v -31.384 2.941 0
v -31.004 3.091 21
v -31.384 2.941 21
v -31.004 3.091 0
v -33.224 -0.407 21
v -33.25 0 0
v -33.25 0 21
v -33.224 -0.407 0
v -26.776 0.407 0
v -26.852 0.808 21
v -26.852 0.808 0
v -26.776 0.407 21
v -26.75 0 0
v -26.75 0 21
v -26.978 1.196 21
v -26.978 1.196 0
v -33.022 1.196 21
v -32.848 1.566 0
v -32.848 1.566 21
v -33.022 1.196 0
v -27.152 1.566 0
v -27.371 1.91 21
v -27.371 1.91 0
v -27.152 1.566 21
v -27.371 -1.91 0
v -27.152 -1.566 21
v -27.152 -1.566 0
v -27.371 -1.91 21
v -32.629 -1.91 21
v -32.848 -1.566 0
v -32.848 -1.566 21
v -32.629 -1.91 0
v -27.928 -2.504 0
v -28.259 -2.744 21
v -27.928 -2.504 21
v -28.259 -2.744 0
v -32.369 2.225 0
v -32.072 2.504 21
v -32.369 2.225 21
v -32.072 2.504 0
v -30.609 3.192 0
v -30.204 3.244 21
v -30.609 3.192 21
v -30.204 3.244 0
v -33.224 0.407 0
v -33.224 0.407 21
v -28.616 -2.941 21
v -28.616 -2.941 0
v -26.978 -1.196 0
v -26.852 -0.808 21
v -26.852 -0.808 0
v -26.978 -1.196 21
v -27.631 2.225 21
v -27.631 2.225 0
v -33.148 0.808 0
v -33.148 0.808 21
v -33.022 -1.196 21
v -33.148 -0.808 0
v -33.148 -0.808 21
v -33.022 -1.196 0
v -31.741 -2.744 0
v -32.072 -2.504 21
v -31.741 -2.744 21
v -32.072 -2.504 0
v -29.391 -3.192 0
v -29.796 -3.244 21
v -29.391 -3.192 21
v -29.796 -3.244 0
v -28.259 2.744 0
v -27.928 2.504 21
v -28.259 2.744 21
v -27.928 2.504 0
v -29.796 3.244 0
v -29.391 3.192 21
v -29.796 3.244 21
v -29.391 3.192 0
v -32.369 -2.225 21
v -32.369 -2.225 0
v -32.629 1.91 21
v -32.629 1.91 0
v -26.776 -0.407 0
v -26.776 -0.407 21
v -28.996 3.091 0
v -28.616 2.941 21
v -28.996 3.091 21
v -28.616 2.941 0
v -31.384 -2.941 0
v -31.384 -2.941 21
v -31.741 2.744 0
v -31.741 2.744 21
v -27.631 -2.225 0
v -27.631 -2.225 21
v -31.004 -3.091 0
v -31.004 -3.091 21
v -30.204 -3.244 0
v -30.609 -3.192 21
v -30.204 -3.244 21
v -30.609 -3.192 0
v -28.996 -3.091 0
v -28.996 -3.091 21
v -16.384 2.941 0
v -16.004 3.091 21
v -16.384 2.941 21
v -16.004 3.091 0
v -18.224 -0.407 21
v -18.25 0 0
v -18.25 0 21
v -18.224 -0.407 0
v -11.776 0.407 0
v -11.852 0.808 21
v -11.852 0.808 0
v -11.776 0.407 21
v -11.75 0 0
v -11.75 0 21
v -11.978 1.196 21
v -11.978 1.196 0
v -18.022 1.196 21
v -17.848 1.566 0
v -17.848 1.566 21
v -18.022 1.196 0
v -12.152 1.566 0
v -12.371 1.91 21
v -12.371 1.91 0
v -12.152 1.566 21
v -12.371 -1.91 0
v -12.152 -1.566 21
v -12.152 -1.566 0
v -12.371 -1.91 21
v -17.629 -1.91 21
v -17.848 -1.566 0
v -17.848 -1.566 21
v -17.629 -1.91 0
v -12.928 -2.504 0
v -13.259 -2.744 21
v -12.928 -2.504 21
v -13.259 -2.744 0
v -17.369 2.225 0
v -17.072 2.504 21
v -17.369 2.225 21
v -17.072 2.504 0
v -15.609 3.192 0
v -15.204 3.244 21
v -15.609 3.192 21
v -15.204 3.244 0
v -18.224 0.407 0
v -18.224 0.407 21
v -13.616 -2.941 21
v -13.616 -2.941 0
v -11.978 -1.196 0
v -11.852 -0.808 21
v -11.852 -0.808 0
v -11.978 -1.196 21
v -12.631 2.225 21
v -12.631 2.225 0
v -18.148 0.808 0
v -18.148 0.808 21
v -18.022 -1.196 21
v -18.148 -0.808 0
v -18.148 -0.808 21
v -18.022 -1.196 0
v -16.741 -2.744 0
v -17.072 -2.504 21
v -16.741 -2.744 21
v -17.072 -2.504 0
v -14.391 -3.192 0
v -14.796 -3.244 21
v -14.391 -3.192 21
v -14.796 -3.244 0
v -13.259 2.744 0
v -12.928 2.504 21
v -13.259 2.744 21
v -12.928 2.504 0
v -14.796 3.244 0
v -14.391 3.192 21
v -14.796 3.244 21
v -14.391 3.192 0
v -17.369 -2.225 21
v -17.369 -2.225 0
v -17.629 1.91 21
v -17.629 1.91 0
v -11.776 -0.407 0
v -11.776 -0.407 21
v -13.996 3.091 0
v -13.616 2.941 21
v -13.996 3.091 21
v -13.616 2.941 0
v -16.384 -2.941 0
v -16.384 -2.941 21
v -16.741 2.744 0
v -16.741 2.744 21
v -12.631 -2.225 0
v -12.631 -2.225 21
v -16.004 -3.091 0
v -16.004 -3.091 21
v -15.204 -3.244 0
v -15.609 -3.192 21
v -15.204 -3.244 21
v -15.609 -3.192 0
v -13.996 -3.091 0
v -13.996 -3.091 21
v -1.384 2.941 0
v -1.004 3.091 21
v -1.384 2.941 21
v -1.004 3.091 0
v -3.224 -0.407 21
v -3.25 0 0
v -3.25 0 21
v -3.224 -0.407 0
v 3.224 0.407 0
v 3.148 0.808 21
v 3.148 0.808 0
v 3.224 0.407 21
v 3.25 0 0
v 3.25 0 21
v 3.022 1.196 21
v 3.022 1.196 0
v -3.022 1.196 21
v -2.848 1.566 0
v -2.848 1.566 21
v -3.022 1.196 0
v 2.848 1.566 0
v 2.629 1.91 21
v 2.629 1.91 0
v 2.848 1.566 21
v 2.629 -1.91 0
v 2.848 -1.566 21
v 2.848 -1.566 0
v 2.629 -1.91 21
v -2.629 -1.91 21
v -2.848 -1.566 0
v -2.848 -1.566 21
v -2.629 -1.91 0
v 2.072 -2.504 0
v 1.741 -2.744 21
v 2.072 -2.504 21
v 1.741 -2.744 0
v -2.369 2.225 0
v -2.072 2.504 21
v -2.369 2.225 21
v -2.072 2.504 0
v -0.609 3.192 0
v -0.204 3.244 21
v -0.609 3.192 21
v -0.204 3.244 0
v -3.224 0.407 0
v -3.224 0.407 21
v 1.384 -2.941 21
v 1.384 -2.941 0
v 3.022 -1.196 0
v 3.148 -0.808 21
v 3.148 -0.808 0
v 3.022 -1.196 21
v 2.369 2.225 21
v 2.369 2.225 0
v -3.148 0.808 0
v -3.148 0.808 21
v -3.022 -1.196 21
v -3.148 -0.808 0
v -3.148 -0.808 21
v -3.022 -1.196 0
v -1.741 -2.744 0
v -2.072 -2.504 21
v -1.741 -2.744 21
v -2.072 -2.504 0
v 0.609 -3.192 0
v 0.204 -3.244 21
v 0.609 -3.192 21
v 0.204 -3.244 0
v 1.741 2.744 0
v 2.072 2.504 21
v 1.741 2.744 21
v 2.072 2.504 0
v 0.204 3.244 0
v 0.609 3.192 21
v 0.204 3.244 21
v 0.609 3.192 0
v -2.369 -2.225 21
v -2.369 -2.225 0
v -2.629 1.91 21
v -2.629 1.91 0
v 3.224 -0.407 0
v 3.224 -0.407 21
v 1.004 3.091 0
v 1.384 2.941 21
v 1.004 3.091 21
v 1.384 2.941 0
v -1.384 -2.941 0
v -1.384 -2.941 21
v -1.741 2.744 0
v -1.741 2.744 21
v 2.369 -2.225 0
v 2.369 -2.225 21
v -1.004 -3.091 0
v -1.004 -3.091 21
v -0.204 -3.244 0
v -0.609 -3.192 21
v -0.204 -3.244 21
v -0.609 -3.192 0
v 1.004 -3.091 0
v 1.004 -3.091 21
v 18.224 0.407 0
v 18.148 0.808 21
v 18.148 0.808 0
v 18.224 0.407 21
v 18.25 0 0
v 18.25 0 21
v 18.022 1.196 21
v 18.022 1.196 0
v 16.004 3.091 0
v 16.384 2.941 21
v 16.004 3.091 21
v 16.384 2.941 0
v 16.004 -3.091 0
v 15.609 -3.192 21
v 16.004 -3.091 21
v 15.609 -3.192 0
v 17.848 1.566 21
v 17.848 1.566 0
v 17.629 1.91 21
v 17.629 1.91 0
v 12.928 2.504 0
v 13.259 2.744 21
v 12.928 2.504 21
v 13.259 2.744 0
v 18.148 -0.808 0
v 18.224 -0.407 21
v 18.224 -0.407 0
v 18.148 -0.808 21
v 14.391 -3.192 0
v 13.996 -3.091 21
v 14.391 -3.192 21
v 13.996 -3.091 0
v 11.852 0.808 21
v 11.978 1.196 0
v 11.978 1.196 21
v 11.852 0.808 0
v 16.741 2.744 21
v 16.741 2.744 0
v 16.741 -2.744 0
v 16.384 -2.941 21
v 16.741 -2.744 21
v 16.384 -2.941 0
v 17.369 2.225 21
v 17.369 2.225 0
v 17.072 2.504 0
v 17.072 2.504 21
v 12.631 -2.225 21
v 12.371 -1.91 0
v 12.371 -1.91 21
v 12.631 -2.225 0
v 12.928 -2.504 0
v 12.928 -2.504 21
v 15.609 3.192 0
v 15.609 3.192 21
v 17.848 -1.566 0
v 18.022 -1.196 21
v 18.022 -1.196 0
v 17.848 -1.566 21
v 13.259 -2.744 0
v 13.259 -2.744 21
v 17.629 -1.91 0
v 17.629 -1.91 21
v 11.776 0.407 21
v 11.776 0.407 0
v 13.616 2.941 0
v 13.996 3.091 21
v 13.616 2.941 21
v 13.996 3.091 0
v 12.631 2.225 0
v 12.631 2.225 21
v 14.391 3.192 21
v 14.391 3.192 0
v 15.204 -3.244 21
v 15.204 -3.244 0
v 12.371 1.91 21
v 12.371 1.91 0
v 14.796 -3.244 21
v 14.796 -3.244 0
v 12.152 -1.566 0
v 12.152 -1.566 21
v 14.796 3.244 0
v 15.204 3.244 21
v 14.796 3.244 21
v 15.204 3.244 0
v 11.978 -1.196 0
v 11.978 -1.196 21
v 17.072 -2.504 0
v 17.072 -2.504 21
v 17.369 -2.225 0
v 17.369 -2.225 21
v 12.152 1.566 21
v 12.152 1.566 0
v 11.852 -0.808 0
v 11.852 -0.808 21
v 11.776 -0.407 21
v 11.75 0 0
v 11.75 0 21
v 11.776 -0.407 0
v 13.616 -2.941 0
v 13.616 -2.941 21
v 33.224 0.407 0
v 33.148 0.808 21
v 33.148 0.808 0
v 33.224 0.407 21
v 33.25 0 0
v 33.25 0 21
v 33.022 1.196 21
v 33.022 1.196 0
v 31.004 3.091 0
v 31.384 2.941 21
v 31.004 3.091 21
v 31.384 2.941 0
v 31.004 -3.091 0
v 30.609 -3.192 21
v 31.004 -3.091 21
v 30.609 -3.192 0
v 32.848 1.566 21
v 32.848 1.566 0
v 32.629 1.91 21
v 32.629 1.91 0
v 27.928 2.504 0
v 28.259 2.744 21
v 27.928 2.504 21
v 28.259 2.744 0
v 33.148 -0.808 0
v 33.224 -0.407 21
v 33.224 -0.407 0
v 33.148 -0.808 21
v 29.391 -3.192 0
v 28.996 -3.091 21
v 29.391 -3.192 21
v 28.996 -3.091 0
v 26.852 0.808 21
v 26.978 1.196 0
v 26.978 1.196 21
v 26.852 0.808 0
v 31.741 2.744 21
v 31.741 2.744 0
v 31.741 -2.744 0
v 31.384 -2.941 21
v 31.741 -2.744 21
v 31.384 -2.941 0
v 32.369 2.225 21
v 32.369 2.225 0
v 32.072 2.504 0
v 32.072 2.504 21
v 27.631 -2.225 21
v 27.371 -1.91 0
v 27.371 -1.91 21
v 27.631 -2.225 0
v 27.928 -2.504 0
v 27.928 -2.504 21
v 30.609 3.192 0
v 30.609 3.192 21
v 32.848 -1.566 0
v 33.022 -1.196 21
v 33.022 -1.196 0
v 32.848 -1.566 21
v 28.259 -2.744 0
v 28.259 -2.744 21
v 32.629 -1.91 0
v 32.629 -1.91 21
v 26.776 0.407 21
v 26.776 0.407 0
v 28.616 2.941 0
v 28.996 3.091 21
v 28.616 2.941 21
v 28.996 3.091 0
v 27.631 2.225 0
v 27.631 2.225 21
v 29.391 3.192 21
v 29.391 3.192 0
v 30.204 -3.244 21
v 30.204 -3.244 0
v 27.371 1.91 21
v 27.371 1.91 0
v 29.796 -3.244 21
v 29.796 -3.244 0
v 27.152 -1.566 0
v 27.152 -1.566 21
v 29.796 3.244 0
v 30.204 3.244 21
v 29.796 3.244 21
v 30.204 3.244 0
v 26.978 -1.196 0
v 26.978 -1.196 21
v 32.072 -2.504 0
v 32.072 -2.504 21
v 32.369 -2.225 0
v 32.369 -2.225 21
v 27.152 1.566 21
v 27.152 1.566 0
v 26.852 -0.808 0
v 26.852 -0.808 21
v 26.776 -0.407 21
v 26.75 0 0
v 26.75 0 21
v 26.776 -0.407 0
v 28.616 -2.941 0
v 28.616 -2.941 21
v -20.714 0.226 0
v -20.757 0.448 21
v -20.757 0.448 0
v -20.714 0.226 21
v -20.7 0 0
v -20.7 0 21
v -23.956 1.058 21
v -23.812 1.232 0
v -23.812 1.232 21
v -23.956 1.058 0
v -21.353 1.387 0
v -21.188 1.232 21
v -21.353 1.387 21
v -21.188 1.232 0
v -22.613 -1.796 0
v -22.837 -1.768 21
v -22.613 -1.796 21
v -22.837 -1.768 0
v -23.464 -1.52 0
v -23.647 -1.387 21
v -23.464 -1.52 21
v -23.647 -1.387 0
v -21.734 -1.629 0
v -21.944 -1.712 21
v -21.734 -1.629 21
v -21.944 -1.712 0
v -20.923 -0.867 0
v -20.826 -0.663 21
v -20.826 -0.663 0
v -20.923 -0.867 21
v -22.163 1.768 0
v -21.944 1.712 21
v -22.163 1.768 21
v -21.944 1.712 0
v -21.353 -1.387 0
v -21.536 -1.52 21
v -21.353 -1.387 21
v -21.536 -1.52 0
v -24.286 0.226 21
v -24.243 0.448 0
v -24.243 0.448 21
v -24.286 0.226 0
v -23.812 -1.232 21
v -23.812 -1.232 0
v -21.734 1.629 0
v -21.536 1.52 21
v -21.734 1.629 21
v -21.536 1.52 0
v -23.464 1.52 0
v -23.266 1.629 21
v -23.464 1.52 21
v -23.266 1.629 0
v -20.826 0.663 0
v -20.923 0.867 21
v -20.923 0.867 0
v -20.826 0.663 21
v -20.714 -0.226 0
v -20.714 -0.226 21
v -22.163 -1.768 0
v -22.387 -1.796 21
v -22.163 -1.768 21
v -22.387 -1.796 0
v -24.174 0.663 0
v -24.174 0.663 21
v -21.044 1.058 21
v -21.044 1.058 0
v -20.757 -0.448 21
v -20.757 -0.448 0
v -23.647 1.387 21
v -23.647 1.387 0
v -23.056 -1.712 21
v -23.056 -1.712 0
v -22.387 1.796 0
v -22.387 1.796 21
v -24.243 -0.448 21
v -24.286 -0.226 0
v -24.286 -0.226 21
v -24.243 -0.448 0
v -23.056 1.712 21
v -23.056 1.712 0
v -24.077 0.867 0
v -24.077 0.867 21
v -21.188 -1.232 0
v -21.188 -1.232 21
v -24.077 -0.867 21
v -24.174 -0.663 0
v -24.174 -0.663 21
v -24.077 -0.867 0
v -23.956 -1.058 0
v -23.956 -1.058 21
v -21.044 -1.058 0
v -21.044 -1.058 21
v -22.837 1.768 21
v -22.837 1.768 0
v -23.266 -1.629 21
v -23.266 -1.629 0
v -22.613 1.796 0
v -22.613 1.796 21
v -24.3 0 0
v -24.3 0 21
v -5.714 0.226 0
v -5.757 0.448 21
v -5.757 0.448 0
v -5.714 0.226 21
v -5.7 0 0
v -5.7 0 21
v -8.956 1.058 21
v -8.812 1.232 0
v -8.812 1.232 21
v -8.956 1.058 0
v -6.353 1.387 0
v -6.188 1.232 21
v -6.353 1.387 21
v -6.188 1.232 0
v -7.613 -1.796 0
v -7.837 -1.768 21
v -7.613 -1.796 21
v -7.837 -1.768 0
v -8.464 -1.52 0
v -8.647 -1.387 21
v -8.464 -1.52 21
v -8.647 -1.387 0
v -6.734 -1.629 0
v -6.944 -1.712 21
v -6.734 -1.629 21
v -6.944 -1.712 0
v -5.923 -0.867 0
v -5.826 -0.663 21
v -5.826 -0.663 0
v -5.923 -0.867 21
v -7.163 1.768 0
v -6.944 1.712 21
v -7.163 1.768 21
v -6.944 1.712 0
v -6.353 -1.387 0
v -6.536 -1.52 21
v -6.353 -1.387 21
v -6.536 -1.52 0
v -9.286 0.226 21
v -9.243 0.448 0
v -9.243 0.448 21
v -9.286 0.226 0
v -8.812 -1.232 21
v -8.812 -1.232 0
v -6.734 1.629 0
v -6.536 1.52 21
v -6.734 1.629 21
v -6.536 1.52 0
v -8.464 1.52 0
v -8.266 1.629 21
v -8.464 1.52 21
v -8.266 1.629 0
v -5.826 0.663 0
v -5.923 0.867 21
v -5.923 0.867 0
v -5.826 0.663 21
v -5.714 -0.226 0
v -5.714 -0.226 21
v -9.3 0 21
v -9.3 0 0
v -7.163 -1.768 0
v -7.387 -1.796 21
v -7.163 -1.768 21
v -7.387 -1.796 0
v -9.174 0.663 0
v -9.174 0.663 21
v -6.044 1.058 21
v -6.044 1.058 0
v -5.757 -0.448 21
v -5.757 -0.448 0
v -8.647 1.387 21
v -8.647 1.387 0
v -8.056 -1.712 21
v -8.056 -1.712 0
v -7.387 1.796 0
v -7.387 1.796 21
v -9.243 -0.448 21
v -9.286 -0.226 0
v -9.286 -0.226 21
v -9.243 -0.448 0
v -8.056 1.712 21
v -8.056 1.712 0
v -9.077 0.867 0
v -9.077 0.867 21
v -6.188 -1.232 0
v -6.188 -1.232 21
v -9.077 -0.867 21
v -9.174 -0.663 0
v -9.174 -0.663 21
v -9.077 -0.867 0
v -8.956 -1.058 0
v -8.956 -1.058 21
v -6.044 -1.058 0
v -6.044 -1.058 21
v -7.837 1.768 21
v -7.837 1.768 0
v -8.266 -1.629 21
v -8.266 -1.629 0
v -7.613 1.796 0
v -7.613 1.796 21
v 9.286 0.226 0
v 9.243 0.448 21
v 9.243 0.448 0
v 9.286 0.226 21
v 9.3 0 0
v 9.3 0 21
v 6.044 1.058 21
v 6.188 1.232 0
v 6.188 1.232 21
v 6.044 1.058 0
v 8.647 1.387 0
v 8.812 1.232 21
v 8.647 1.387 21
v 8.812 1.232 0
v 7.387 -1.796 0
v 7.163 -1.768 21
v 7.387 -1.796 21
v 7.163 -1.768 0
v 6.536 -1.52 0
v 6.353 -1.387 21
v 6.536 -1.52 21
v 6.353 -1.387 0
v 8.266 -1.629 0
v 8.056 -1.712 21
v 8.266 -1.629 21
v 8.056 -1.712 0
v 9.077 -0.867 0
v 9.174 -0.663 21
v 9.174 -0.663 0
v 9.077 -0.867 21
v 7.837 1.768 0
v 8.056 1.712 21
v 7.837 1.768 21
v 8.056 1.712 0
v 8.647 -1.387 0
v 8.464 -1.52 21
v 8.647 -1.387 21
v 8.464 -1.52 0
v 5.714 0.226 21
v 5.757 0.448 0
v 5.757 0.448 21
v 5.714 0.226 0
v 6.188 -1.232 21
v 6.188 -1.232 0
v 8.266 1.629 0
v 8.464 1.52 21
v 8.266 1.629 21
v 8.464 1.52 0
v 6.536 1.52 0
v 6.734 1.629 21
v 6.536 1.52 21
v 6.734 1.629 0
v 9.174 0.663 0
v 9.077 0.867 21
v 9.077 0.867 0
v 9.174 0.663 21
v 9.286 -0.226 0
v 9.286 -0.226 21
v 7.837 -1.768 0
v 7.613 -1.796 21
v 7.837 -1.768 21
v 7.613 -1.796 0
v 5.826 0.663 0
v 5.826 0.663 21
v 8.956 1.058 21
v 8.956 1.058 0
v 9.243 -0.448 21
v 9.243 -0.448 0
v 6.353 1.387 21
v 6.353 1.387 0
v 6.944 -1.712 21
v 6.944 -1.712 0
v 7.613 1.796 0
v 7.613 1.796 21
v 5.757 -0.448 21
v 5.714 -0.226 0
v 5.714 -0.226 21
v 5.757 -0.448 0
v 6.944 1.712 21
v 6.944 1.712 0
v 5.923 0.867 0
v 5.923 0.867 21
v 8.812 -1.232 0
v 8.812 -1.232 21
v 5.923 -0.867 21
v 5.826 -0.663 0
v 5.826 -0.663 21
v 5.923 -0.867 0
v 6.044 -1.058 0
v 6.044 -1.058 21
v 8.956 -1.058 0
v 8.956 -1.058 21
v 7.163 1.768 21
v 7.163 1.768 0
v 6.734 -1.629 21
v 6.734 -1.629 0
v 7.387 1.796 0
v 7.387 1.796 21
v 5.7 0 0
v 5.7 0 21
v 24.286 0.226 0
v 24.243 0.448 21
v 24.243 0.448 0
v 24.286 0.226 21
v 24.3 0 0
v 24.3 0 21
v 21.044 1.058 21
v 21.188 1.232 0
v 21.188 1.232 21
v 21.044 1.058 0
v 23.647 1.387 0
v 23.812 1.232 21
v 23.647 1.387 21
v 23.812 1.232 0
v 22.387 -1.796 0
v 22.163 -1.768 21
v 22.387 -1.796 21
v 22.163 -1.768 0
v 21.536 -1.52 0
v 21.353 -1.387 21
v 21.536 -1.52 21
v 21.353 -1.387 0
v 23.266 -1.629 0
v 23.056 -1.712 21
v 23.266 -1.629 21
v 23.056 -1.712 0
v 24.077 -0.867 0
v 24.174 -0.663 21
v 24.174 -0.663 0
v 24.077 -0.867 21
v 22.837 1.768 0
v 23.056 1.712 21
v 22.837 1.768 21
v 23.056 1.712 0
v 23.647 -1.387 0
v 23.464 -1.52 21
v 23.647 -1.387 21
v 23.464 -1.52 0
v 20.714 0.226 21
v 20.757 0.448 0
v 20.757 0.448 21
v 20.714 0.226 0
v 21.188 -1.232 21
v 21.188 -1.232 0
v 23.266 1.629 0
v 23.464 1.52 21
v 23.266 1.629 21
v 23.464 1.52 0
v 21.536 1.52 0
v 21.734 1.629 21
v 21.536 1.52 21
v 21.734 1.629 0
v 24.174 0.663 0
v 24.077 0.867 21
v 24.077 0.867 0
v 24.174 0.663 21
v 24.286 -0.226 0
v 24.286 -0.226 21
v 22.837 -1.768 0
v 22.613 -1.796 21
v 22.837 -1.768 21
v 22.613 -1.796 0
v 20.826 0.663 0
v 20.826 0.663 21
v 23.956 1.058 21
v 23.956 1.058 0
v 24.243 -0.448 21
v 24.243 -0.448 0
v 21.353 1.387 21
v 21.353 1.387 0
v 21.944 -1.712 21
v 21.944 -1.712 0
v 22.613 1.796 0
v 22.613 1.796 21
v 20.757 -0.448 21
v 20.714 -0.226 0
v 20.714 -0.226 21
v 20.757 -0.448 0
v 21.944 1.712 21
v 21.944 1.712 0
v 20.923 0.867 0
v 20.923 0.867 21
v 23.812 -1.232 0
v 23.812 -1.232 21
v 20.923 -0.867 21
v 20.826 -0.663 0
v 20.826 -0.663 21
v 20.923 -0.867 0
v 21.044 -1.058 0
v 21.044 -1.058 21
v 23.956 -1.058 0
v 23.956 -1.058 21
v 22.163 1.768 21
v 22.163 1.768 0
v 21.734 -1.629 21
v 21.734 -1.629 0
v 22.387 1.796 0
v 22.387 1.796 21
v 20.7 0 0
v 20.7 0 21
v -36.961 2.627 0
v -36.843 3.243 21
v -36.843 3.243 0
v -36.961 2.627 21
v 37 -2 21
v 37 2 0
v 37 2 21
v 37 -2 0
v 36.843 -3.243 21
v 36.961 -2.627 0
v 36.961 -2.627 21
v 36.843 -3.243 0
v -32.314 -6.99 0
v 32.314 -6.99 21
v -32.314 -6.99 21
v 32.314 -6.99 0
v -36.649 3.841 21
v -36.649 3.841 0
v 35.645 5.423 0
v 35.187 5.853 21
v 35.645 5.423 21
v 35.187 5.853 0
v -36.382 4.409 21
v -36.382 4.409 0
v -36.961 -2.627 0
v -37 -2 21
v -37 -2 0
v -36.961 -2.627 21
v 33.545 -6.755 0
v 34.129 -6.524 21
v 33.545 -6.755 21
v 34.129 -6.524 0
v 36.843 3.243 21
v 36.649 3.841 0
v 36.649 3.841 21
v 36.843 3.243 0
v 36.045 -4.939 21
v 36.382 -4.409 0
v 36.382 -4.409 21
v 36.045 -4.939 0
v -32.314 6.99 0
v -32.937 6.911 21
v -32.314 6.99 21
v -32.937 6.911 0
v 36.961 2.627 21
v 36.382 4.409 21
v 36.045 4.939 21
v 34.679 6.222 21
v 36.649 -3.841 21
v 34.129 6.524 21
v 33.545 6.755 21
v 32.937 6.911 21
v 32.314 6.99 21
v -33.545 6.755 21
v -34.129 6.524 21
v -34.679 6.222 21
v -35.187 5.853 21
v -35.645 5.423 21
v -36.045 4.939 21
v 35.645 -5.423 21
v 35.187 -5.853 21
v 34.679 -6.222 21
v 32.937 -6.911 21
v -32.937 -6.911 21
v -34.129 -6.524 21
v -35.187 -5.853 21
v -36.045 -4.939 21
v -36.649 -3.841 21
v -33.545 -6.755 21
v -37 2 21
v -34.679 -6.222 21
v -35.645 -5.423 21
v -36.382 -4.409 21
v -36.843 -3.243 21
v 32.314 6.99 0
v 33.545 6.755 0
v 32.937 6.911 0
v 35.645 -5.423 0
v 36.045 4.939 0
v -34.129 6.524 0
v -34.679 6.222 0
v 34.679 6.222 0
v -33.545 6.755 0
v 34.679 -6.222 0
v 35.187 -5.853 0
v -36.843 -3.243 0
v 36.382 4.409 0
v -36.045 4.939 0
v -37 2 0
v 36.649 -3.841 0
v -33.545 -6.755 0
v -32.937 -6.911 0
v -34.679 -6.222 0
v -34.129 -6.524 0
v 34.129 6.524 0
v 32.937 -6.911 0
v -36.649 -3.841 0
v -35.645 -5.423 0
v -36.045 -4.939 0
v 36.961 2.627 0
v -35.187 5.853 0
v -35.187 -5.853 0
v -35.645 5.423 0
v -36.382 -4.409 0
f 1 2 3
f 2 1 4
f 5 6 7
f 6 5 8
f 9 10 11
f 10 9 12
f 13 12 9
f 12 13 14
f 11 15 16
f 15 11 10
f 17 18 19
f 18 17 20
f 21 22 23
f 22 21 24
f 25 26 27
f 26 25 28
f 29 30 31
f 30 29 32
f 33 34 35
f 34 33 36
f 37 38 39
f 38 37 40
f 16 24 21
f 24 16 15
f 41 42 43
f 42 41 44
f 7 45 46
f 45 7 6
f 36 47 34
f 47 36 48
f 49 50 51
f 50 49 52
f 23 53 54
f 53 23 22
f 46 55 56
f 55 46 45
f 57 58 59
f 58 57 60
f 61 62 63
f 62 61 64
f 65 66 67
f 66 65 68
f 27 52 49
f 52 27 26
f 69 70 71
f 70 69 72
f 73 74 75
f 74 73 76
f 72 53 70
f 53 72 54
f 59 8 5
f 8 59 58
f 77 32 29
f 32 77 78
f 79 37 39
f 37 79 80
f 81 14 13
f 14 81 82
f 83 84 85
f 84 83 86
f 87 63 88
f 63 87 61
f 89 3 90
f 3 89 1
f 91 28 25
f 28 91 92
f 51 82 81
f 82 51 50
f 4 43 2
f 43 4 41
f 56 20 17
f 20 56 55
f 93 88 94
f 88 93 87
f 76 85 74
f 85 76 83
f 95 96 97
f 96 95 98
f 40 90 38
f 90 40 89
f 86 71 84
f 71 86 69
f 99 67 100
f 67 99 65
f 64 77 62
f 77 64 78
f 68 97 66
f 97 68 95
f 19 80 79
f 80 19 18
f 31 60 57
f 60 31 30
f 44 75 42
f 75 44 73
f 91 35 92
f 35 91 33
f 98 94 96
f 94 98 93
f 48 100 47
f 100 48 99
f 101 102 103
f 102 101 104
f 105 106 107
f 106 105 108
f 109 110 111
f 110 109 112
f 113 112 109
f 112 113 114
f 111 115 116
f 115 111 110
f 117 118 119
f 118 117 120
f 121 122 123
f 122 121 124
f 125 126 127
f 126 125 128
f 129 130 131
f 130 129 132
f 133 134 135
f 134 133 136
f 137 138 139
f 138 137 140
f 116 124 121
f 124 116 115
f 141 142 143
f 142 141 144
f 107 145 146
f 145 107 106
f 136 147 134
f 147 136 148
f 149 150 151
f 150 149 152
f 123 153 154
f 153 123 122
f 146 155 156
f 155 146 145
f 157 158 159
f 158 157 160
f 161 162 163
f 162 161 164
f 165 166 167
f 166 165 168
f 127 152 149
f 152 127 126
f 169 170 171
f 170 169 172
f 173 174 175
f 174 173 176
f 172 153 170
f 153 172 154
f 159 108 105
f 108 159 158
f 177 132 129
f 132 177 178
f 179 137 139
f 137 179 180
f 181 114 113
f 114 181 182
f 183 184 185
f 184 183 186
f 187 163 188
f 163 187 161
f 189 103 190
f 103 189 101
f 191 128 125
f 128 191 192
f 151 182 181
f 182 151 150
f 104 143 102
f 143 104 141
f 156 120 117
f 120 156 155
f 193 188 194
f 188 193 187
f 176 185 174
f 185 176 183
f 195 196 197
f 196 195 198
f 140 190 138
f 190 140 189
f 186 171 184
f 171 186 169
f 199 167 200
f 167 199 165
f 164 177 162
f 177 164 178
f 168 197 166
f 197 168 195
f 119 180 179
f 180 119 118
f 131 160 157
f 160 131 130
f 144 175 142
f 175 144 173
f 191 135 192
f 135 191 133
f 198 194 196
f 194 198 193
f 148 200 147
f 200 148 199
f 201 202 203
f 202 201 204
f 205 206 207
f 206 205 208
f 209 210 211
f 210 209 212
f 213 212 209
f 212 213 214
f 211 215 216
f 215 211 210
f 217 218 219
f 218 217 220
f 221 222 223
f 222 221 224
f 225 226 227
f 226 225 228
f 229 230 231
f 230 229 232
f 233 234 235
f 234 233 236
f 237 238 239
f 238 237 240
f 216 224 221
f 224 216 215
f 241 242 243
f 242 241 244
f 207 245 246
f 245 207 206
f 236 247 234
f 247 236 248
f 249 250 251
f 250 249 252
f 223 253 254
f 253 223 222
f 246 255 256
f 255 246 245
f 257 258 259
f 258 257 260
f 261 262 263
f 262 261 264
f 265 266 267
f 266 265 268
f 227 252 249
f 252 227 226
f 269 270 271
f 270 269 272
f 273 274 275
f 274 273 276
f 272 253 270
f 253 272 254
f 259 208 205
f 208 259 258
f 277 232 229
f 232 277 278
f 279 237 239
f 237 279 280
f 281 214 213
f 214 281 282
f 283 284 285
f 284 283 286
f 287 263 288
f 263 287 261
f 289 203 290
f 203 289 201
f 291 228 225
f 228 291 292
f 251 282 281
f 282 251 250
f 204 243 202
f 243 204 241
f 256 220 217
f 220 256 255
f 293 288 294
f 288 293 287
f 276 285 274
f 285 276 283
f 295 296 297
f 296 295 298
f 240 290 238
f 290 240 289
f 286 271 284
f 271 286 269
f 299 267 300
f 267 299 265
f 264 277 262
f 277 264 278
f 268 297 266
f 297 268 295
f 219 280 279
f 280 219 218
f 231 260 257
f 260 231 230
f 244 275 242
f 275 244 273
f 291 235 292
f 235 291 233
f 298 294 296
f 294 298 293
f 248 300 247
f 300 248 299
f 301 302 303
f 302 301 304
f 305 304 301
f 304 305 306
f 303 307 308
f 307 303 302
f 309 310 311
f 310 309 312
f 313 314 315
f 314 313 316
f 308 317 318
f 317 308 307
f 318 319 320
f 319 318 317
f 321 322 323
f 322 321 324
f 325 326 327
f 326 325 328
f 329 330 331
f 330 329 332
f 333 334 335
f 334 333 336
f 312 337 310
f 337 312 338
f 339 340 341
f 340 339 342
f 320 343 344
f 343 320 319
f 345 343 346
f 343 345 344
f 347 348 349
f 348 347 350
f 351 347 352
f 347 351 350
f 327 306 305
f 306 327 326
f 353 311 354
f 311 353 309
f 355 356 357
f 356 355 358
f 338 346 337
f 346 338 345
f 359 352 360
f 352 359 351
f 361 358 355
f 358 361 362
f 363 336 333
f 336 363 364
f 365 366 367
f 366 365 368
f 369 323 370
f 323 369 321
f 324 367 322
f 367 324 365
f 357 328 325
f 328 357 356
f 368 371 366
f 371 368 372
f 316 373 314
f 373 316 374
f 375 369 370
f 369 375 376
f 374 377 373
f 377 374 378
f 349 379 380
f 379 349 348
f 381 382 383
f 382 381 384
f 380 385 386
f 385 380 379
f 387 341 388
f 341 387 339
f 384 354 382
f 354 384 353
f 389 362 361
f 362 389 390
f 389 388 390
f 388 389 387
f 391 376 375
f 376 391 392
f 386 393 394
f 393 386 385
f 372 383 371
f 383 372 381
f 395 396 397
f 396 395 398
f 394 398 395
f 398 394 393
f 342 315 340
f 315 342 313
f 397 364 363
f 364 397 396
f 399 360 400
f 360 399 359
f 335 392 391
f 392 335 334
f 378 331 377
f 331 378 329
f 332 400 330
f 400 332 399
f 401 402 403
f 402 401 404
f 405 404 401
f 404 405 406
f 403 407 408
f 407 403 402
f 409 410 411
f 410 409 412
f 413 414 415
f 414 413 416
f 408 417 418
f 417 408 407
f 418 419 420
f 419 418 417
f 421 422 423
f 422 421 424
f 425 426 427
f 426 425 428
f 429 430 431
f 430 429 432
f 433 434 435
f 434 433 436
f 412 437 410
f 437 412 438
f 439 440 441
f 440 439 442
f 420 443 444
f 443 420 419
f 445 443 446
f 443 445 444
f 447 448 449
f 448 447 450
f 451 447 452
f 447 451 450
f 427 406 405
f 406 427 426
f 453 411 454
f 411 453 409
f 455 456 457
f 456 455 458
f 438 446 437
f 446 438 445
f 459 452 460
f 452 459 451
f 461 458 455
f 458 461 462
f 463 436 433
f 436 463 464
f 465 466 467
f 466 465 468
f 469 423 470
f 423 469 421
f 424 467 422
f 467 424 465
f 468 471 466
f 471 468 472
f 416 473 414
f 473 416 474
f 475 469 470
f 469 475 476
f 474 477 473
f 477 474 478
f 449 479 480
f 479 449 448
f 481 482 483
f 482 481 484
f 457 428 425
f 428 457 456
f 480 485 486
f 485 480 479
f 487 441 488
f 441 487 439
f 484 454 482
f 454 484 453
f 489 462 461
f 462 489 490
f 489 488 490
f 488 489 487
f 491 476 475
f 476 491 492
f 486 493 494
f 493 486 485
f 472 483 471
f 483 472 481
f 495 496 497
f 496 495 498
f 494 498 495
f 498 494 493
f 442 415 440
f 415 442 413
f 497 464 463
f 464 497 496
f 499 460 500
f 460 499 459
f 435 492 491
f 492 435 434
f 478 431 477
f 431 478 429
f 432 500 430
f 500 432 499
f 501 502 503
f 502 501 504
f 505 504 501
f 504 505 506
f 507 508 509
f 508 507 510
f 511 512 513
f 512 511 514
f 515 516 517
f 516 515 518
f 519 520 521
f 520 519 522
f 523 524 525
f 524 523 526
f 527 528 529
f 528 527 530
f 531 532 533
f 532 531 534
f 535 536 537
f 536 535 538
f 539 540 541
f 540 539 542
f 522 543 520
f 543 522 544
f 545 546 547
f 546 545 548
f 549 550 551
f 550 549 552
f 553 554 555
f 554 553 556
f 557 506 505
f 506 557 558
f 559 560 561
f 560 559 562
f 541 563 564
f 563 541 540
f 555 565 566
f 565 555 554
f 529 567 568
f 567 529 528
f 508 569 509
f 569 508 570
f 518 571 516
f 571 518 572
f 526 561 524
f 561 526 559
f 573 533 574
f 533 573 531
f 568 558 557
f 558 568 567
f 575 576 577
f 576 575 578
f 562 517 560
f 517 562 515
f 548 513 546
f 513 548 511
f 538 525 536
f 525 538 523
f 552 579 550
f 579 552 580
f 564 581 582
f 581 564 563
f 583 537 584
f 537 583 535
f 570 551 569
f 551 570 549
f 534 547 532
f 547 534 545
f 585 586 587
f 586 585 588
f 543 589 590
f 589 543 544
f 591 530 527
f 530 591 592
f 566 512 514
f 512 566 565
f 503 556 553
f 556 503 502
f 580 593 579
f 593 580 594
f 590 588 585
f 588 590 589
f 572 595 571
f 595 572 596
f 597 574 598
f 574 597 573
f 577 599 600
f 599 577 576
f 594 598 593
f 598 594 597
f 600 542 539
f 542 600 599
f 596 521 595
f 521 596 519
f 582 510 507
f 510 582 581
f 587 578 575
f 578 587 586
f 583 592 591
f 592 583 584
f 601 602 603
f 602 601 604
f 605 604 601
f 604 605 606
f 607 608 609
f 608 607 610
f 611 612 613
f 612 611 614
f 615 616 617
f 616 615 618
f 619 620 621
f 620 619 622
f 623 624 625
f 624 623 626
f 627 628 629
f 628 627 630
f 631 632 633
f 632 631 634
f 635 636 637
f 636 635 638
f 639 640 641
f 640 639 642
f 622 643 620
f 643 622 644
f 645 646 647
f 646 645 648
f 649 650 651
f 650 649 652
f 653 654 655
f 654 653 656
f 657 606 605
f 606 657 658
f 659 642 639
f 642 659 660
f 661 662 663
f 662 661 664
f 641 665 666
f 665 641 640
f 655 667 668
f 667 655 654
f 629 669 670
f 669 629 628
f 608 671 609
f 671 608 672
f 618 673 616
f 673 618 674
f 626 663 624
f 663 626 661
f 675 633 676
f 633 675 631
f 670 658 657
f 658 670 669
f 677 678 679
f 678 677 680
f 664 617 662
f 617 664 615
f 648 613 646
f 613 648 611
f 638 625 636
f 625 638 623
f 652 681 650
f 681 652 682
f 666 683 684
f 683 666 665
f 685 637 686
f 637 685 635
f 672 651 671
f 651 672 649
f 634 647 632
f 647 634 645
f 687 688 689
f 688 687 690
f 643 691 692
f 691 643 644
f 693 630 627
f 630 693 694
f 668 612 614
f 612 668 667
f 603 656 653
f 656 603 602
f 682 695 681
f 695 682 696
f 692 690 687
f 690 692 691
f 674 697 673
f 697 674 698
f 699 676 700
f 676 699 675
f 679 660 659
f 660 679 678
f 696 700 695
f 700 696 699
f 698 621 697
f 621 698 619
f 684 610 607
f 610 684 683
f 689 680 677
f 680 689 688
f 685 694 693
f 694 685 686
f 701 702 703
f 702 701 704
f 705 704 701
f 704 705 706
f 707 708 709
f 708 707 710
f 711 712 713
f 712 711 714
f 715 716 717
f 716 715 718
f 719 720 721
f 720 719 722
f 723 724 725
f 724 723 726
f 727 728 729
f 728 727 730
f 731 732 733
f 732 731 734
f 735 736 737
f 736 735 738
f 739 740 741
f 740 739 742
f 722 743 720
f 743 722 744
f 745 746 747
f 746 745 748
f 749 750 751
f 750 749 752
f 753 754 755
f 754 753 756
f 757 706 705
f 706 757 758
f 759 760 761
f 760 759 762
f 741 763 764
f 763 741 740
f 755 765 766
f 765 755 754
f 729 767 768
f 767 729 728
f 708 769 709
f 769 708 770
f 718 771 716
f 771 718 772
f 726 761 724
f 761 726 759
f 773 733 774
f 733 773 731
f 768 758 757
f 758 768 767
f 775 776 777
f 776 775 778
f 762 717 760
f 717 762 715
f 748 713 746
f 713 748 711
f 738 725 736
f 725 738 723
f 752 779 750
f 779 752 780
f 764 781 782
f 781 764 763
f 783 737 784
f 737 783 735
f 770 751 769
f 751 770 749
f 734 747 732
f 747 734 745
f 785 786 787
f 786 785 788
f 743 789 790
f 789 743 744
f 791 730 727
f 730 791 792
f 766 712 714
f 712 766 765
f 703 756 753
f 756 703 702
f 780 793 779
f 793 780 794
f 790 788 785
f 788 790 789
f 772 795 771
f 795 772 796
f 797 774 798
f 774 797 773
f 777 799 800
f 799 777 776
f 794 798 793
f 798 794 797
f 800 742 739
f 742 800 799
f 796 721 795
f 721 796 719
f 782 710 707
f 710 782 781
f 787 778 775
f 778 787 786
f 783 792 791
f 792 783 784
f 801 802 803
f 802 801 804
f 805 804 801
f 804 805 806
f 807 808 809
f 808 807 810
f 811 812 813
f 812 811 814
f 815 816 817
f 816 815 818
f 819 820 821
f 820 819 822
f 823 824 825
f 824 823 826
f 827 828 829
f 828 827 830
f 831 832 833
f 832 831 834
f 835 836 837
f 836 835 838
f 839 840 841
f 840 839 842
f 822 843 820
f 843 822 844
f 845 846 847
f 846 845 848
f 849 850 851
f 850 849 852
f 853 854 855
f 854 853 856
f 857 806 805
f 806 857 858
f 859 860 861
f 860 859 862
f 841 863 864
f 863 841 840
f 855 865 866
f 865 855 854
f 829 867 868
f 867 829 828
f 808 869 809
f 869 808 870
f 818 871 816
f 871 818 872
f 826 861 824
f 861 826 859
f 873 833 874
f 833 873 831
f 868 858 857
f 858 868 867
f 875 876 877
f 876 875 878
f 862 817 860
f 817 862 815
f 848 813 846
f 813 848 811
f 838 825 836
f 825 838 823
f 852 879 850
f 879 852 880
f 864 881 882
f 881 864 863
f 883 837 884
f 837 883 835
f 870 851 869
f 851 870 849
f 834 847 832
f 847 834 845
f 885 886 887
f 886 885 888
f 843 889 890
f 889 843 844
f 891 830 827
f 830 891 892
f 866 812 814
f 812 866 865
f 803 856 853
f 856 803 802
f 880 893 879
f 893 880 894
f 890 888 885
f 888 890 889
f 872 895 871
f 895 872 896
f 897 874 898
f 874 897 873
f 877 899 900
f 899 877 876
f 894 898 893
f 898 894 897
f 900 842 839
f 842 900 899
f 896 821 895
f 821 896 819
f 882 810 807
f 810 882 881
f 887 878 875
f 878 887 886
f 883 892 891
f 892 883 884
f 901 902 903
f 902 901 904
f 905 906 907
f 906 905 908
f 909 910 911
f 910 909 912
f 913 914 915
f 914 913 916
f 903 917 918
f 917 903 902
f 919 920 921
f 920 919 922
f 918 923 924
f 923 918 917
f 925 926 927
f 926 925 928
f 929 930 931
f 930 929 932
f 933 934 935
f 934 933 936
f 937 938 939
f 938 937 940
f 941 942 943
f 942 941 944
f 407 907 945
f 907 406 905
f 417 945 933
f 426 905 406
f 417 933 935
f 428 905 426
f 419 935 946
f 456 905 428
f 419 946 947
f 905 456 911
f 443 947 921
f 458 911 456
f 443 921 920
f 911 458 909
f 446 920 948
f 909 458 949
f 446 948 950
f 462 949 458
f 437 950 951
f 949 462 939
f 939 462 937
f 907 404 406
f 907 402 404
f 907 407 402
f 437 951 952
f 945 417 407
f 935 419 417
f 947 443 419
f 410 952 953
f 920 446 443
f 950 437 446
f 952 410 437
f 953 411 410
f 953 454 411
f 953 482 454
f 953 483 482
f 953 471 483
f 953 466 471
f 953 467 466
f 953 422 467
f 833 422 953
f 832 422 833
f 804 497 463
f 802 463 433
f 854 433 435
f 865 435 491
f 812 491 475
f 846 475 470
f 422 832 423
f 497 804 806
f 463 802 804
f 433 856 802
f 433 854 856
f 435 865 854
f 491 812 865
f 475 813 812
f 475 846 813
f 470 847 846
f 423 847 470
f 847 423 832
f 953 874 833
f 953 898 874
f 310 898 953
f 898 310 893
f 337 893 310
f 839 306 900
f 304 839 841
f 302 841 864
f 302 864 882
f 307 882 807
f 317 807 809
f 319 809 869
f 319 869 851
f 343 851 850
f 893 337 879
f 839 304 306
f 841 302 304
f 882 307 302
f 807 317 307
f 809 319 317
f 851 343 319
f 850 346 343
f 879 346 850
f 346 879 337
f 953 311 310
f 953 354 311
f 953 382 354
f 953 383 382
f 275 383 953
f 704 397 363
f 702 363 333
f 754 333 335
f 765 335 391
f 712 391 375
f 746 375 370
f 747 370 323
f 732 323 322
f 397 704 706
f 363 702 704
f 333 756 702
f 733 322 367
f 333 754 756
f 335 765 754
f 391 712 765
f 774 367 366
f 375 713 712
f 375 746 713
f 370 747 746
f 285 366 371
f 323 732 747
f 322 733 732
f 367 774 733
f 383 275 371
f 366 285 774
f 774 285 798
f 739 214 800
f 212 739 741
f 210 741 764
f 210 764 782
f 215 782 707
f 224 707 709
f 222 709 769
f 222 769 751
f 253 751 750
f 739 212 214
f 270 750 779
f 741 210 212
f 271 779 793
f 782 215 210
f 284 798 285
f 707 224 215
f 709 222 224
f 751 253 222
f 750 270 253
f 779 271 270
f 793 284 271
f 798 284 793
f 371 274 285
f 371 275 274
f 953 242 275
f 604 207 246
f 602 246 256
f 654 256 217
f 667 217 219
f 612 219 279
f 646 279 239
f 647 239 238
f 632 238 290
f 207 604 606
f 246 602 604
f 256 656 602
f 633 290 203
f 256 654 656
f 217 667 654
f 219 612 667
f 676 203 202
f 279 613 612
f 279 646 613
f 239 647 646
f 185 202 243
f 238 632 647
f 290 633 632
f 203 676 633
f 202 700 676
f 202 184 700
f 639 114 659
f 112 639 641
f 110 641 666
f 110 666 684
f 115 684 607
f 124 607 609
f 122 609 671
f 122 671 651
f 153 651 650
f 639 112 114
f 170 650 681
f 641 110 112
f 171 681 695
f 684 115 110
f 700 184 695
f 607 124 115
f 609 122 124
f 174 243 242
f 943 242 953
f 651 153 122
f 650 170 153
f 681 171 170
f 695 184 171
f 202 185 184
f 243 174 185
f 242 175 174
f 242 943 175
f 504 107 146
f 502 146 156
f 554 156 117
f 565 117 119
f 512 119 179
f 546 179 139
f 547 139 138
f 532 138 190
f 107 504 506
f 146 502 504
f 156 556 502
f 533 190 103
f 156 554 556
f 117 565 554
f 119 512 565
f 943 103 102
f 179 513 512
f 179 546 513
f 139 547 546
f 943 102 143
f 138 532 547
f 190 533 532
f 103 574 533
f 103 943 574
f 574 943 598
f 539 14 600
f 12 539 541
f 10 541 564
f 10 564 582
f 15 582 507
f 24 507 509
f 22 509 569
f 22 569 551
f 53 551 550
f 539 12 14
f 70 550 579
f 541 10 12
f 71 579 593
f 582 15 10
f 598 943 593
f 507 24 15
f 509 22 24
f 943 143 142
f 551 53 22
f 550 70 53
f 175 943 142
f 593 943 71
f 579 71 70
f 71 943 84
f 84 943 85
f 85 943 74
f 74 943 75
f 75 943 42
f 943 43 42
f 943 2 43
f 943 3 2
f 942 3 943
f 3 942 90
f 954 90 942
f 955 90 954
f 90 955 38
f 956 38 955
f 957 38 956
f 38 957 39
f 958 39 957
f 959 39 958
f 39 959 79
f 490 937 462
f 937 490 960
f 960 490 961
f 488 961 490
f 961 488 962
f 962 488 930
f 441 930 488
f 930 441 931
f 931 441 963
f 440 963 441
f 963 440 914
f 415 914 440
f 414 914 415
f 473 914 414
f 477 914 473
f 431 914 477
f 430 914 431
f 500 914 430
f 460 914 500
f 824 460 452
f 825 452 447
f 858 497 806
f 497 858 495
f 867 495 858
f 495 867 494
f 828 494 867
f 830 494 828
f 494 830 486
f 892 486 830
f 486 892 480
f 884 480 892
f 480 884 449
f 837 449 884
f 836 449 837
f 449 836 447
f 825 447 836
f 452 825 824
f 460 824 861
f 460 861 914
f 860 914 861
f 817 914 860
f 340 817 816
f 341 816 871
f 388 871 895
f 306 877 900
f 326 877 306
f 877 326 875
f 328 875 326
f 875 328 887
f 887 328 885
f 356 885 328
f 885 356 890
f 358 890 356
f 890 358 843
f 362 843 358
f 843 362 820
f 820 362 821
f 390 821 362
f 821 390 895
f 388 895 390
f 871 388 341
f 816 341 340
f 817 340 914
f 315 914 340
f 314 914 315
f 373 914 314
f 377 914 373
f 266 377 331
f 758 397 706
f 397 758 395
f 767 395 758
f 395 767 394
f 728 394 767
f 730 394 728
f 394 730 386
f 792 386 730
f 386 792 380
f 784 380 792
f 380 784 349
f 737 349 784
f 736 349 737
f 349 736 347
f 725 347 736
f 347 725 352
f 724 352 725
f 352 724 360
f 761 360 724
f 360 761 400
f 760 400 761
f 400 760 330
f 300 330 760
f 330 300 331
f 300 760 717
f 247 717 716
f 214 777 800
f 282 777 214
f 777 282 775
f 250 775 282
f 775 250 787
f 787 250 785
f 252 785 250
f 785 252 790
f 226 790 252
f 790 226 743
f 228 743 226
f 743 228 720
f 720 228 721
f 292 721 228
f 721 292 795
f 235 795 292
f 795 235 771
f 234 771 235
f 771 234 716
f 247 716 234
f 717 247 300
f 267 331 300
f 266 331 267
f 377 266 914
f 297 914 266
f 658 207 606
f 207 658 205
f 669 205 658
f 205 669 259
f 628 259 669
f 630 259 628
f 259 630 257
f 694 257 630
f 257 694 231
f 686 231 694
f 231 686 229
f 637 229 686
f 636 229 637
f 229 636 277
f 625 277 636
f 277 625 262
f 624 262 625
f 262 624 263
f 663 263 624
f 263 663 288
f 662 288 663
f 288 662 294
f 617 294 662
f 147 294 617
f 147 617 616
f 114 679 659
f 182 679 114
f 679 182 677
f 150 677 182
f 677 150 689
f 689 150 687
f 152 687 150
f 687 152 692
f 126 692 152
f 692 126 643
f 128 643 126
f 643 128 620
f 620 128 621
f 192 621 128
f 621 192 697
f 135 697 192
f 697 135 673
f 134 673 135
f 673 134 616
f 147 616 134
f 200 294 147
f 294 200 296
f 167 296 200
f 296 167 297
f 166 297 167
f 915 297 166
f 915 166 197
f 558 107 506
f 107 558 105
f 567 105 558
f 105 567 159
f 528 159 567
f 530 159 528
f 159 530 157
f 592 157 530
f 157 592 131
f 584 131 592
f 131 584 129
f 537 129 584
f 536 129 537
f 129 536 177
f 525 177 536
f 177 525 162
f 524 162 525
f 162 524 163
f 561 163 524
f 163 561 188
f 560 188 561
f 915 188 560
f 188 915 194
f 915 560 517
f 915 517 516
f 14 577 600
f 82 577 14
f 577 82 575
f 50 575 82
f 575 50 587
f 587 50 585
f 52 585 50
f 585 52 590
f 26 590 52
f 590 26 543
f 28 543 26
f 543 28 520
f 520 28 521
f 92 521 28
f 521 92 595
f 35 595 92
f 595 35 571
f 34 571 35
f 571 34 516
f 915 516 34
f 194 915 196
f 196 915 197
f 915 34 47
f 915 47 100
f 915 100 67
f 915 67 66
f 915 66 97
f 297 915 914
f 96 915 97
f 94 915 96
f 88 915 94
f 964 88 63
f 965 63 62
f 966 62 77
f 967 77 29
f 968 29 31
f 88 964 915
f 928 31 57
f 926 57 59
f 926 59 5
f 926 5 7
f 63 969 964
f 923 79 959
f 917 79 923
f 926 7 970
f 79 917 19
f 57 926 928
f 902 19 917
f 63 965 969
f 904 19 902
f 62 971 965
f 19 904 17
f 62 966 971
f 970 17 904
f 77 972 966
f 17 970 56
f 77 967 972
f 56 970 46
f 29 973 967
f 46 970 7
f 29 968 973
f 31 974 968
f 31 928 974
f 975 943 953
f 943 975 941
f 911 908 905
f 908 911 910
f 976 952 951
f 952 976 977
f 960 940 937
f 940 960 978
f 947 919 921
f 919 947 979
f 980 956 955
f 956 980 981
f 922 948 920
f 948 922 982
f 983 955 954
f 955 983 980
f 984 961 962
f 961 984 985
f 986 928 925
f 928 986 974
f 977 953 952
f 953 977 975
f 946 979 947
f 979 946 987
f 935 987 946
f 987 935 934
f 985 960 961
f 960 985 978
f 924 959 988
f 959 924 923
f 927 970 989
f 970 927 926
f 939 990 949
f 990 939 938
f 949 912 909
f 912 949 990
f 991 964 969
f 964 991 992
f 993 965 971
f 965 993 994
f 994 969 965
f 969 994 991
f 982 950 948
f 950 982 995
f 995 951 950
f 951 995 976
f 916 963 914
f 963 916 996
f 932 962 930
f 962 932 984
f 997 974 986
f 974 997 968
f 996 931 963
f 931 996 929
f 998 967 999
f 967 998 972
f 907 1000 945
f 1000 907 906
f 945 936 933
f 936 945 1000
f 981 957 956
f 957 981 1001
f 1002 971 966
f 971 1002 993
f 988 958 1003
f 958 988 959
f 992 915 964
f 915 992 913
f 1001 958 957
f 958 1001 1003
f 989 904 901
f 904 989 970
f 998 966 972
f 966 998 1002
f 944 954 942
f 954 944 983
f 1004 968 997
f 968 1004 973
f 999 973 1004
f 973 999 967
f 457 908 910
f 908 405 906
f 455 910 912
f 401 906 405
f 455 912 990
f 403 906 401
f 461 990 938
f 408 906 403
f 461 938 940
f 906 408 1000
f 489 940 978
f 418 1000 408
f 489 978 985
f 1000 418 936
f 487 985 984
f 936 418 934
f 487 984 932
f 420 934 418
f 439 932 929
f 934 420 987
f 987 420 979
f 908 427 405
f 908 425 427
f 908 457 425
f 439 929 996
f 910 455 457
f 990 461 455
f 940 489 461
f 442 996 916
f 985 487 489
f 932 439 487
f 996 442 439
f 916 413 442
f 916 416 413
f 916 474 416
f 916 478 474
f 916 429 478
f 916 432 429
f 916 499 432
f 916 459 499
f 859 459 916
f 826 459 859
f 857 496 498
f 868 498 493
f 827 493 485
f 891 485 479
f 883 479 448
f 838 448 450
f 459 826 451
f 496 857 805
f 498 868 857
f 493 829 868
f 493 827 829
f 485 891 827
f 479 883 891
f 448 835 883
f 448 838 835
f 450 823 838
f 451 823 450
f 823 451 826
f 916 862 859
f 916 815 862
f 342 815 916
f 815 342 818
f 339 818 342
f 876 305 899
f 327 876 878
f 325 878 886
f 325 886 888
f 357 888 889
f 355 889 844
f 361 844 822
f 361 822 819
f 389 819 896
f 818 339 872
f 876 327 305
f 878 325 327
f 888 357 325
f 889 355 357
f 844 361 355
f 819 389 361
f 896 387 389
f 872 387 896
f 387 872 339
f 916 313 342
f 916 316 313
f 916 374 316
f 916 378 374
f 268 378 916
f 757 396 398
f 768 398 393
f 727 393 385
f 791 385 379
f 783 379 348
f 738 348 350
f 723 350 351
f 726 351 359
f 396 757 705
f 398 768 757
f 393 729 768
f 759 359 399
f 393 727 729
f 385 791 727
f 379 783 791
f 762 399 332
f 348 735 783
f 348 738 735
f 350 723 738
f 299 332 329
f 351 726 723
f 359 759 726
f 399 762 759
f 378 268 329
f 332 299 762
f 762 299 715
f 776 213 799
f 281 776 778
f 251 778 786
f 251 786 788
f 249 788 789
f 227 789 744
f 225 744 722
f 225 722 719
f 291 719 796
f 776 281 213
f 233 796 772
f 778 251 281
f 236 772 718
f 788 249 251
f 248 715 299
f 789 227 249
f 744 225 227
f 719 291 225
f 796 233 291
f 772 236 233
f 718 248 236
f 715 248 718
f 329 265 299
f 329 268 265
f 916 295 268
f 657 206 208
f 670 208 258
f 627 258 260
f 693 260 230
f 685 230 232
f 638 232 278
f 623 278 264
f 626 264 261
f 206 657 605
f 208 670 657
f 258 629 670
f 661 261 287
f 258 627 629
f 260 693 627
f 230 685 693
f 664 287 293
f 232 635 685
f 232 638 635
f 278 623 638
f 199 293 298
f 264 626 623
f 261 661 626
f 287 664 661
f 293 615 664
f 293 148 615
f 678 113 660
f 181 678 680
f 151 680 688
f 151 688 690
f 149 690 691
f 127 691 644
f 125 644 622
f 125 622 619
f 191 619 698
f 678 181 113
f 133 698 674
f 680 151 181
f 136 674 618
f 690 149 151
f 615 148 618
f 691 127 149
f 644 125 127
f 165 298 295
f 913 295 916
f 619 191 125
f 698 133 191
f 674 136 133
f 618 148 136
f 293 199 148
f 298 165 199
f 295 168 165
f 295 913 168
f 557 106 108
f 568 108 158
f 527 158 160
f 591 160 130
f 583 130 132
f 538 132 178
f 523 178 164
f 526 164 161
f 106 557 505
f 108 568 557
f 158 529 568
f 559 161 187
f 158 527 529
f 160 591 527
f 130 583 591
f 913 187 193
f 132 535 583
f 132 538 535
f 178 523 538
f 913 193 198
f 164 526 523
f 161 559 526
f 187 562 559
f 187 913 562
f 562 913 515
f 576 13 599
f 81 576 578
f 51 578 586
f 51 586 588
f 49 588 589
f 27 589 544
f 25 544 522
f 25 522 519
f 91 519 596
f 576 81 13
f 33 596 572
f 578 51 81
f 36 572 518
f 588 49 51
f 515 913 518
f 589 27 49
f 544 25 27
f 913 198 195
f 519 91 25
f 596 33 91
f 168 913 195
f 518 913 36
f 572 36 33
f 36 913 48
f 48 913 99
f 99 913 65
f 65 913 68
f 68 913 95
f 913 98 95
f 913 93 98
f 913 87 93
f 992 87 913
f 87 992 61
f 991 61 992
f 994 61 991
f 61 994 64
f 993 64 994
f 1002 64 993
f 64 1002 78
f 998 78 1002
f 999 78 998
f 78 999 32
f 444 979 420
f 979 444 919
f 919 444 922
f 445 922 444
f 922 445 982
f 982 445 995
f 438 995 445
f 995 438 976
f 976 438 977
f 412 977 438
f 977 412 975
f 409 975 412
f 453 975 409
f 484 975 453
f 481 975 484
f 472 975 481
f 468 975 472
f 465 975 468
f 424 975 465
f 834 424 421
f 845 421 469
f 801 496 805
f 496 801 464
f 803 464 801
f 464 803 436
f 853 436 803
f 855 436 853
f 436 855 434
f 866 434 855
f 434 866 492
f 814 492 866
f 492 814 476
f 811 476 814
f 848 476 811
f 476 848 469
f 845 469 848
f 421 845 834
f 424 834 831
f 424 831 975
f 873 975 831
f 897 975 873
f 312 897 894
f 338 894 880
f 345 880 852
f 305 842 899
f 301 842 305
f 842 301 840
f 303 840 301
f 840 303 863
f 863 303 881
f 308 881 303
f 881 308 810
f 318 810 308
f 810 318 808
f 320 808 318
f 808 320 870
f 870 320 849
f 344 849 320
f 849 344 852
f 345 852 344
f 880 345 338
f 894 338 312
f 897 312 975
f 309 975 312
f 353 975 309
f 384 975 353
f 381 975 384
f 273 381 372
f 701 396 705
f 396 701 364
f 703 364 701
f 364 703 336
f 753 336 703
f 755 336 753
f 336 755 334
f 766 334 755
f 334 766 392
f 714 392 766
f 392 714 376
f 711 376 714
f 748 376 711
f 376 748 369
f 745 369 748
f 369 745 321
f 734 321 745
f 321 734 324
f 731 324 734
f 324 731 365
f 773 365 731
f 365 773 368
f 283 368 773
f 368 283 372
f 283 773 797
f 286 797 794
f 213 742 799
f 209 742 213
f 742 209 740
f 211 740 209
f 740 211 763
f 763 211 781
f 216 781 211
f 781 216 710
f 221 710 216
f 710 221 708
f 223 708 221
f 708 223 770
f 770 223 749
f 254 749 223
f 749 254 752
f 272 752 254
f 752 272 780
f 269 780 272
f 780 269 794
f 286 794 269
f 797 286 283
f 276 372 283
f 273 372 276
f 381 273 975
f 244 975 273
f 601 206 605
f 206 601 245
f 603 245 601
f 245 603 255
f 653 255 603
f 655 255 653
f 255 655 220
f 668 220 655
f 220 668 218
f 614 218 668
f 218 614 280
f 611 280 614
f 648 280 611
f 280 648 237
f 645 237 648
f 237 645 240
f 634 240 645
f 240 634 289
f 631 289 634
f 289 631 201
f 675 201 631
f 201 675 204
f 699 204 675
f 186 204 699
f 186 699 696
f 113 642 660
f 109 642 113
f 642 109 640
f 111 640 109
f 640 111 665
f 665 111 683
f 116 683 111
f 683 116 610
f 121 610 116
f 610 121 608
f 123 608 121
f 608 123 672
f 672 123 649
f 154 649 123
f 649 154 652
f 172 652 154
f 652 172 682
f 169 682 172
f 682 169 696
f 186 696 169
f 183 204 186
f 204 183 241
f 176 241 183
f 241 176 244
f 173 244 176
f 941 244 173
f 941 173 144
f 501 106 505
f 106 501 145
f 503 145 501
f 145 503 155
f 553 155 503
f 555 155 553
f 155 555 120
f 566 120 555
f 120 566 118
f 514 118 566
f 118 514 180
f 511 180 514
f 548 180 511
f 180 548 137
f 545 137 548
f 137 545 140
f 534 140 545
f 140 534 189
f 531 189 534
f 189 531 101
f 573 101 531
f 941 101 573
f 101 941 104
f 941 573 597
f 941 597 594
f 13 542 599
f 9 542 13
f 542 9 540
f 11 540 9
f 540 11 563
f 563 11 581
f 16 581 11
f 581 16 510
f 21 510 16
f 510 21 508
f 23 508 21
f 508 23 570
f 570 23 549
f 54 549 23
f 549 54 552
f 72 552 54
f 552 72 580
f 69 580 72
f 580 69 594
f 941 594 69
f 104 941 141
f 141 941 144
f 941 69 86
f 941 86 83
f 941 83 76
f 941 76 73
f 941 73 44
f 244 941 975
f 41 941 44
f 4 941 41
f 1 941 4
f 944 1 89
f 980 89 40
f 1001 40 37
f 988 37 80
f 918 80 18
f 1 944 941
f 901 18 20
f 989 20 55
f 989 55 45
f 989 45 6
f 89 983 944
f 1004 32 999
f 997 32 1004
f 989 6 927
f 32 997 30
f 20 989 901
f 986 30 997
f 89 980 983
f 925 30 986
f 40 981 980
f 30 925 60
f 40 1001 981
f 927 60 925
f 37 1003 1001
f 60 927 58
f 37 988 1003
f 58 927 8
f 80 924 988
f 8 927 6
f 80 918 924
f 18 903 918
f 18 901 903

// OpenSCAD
$fn = 50;


difference() {
	union() {
		*color(alpha = 1.0000000000, c = "gray") {
			translate(v = [0, 7, 0]) {
				linear_extrude(height = 1) {
					text(font = "Arial:style=Bold", halign = "center", size = 4.5000000000, text = "COMMENT plate main", valign = "center");
				}
			}
		}
		hull() {
			translate(v = [-32.0000000000, 2.0000000000, 0]) {
				cylinder(h = 21, r = 5);
			}
			translate(v = [32.0000000000, 2.0000000000, 0]) {
				cylinder(h = 21, r = 5);
			}
			translate(v = [-32.0000000000, -2.0000000000, 0]) {
				cylinder(h = 21, r = 5);
			}
			translate(v = [32.0000000000, -2.0000000000, 0]) {
				cylinder(h = 21, r = 5);
			}
		}
	}
	union() {
		*color(alpha = 1.0000000000, c = "gray") {
			translate(v = [0, 7, 0]) {
				linear_extrude(height = 1) {
					text(font = "Arial:style=Bold", halign = "center", size = 4.5000000000, text = "COMMENT holes main", valign = "center");
				}
			}
		}
		translate(v = [-30.0000000000, 0.0000000000, 0]) {
			translate(v = [0, 0, -100]) {
				cylinder(h = 200, r = 3.2500000000);
			}
		}
		translate(v = [-15.0000000000, 0.0000000000, 0]) {
			translate(v = [0, 0, -100]) {
				cylinder(h = 200, r = 3.2500000000);
			}
		}
		translate(v = [0, 0, -100]) {
			cylinder(h = 200, r = 3.2500000000);
		}
		translate(v = [15.0000000000, 0.0000000000, 0]) {
			translate(v = [0, 0, -100]) {
				cylinder(h = 200, r = 3.2500000000);
			}
		}
		translate(v = [30.0000000000, 0.0000000000, 0]) {
			translate(v = [0, 0, -100]) {
				cylinder(h = 200, r = 3.2500000000);
			}
		}
		translate(v = [-30.0000000000, 0.0000000000, 0]) {
			translate(v = [0, 0, -100]) {
				cylinder(h = 200, r = 1.8000000000);
			}
		}
		translate(v = [-22.5000000000, 0.0000000000, 0]) {
			translate(v = [0, 0, -100]) {
				cylinder(h = 200, r = 1.8000000000);
			}
		}
		translate(v = [-15.0000000000, 0.0000000000, 0]) {
			translate(v = [0, 0, -100]) {
				cylinder(h = 200, r = 1.8000000000);
			}
		}
		translate(v = [-7.5000000000, 0.0000000000, 0]) {
			translate(v = [0, 0, -100]) {
				cylinder(h = 200, r = 1.8000000000);
			}
		}
		translate(v = [0, 0, -100]) {
			cylinder(h = 200, r = 1.8000000000);
		}
		translate(v = [7.5000000000, 0.0000000000, 0]) {
			translate(v = [0, 0, -100]) {
				cylinder(h = 200, r = 1.8000000000);
			}
		}
		translate(v = [15.0000000000, 0.0000000000, 0]) {
			translate(v = [0, 0, -100]) {
				cylinder(h = 200, r = 1.8000000000);
			}
		}
		translate(v = [22.5000000000, 0.0000000000, 0]) {
			translate(v = [0, 0, -100]) {
				cylinder(h = 200, r = 1.8000000000);
			}
		}
		translate(v = [30.0000000000, 0.0000000000, 0]) {
			translate(v = [0, 0, -100]) {
				cylinder(h = 200, r = 1.8000000000);
			}
		}
	}
}
